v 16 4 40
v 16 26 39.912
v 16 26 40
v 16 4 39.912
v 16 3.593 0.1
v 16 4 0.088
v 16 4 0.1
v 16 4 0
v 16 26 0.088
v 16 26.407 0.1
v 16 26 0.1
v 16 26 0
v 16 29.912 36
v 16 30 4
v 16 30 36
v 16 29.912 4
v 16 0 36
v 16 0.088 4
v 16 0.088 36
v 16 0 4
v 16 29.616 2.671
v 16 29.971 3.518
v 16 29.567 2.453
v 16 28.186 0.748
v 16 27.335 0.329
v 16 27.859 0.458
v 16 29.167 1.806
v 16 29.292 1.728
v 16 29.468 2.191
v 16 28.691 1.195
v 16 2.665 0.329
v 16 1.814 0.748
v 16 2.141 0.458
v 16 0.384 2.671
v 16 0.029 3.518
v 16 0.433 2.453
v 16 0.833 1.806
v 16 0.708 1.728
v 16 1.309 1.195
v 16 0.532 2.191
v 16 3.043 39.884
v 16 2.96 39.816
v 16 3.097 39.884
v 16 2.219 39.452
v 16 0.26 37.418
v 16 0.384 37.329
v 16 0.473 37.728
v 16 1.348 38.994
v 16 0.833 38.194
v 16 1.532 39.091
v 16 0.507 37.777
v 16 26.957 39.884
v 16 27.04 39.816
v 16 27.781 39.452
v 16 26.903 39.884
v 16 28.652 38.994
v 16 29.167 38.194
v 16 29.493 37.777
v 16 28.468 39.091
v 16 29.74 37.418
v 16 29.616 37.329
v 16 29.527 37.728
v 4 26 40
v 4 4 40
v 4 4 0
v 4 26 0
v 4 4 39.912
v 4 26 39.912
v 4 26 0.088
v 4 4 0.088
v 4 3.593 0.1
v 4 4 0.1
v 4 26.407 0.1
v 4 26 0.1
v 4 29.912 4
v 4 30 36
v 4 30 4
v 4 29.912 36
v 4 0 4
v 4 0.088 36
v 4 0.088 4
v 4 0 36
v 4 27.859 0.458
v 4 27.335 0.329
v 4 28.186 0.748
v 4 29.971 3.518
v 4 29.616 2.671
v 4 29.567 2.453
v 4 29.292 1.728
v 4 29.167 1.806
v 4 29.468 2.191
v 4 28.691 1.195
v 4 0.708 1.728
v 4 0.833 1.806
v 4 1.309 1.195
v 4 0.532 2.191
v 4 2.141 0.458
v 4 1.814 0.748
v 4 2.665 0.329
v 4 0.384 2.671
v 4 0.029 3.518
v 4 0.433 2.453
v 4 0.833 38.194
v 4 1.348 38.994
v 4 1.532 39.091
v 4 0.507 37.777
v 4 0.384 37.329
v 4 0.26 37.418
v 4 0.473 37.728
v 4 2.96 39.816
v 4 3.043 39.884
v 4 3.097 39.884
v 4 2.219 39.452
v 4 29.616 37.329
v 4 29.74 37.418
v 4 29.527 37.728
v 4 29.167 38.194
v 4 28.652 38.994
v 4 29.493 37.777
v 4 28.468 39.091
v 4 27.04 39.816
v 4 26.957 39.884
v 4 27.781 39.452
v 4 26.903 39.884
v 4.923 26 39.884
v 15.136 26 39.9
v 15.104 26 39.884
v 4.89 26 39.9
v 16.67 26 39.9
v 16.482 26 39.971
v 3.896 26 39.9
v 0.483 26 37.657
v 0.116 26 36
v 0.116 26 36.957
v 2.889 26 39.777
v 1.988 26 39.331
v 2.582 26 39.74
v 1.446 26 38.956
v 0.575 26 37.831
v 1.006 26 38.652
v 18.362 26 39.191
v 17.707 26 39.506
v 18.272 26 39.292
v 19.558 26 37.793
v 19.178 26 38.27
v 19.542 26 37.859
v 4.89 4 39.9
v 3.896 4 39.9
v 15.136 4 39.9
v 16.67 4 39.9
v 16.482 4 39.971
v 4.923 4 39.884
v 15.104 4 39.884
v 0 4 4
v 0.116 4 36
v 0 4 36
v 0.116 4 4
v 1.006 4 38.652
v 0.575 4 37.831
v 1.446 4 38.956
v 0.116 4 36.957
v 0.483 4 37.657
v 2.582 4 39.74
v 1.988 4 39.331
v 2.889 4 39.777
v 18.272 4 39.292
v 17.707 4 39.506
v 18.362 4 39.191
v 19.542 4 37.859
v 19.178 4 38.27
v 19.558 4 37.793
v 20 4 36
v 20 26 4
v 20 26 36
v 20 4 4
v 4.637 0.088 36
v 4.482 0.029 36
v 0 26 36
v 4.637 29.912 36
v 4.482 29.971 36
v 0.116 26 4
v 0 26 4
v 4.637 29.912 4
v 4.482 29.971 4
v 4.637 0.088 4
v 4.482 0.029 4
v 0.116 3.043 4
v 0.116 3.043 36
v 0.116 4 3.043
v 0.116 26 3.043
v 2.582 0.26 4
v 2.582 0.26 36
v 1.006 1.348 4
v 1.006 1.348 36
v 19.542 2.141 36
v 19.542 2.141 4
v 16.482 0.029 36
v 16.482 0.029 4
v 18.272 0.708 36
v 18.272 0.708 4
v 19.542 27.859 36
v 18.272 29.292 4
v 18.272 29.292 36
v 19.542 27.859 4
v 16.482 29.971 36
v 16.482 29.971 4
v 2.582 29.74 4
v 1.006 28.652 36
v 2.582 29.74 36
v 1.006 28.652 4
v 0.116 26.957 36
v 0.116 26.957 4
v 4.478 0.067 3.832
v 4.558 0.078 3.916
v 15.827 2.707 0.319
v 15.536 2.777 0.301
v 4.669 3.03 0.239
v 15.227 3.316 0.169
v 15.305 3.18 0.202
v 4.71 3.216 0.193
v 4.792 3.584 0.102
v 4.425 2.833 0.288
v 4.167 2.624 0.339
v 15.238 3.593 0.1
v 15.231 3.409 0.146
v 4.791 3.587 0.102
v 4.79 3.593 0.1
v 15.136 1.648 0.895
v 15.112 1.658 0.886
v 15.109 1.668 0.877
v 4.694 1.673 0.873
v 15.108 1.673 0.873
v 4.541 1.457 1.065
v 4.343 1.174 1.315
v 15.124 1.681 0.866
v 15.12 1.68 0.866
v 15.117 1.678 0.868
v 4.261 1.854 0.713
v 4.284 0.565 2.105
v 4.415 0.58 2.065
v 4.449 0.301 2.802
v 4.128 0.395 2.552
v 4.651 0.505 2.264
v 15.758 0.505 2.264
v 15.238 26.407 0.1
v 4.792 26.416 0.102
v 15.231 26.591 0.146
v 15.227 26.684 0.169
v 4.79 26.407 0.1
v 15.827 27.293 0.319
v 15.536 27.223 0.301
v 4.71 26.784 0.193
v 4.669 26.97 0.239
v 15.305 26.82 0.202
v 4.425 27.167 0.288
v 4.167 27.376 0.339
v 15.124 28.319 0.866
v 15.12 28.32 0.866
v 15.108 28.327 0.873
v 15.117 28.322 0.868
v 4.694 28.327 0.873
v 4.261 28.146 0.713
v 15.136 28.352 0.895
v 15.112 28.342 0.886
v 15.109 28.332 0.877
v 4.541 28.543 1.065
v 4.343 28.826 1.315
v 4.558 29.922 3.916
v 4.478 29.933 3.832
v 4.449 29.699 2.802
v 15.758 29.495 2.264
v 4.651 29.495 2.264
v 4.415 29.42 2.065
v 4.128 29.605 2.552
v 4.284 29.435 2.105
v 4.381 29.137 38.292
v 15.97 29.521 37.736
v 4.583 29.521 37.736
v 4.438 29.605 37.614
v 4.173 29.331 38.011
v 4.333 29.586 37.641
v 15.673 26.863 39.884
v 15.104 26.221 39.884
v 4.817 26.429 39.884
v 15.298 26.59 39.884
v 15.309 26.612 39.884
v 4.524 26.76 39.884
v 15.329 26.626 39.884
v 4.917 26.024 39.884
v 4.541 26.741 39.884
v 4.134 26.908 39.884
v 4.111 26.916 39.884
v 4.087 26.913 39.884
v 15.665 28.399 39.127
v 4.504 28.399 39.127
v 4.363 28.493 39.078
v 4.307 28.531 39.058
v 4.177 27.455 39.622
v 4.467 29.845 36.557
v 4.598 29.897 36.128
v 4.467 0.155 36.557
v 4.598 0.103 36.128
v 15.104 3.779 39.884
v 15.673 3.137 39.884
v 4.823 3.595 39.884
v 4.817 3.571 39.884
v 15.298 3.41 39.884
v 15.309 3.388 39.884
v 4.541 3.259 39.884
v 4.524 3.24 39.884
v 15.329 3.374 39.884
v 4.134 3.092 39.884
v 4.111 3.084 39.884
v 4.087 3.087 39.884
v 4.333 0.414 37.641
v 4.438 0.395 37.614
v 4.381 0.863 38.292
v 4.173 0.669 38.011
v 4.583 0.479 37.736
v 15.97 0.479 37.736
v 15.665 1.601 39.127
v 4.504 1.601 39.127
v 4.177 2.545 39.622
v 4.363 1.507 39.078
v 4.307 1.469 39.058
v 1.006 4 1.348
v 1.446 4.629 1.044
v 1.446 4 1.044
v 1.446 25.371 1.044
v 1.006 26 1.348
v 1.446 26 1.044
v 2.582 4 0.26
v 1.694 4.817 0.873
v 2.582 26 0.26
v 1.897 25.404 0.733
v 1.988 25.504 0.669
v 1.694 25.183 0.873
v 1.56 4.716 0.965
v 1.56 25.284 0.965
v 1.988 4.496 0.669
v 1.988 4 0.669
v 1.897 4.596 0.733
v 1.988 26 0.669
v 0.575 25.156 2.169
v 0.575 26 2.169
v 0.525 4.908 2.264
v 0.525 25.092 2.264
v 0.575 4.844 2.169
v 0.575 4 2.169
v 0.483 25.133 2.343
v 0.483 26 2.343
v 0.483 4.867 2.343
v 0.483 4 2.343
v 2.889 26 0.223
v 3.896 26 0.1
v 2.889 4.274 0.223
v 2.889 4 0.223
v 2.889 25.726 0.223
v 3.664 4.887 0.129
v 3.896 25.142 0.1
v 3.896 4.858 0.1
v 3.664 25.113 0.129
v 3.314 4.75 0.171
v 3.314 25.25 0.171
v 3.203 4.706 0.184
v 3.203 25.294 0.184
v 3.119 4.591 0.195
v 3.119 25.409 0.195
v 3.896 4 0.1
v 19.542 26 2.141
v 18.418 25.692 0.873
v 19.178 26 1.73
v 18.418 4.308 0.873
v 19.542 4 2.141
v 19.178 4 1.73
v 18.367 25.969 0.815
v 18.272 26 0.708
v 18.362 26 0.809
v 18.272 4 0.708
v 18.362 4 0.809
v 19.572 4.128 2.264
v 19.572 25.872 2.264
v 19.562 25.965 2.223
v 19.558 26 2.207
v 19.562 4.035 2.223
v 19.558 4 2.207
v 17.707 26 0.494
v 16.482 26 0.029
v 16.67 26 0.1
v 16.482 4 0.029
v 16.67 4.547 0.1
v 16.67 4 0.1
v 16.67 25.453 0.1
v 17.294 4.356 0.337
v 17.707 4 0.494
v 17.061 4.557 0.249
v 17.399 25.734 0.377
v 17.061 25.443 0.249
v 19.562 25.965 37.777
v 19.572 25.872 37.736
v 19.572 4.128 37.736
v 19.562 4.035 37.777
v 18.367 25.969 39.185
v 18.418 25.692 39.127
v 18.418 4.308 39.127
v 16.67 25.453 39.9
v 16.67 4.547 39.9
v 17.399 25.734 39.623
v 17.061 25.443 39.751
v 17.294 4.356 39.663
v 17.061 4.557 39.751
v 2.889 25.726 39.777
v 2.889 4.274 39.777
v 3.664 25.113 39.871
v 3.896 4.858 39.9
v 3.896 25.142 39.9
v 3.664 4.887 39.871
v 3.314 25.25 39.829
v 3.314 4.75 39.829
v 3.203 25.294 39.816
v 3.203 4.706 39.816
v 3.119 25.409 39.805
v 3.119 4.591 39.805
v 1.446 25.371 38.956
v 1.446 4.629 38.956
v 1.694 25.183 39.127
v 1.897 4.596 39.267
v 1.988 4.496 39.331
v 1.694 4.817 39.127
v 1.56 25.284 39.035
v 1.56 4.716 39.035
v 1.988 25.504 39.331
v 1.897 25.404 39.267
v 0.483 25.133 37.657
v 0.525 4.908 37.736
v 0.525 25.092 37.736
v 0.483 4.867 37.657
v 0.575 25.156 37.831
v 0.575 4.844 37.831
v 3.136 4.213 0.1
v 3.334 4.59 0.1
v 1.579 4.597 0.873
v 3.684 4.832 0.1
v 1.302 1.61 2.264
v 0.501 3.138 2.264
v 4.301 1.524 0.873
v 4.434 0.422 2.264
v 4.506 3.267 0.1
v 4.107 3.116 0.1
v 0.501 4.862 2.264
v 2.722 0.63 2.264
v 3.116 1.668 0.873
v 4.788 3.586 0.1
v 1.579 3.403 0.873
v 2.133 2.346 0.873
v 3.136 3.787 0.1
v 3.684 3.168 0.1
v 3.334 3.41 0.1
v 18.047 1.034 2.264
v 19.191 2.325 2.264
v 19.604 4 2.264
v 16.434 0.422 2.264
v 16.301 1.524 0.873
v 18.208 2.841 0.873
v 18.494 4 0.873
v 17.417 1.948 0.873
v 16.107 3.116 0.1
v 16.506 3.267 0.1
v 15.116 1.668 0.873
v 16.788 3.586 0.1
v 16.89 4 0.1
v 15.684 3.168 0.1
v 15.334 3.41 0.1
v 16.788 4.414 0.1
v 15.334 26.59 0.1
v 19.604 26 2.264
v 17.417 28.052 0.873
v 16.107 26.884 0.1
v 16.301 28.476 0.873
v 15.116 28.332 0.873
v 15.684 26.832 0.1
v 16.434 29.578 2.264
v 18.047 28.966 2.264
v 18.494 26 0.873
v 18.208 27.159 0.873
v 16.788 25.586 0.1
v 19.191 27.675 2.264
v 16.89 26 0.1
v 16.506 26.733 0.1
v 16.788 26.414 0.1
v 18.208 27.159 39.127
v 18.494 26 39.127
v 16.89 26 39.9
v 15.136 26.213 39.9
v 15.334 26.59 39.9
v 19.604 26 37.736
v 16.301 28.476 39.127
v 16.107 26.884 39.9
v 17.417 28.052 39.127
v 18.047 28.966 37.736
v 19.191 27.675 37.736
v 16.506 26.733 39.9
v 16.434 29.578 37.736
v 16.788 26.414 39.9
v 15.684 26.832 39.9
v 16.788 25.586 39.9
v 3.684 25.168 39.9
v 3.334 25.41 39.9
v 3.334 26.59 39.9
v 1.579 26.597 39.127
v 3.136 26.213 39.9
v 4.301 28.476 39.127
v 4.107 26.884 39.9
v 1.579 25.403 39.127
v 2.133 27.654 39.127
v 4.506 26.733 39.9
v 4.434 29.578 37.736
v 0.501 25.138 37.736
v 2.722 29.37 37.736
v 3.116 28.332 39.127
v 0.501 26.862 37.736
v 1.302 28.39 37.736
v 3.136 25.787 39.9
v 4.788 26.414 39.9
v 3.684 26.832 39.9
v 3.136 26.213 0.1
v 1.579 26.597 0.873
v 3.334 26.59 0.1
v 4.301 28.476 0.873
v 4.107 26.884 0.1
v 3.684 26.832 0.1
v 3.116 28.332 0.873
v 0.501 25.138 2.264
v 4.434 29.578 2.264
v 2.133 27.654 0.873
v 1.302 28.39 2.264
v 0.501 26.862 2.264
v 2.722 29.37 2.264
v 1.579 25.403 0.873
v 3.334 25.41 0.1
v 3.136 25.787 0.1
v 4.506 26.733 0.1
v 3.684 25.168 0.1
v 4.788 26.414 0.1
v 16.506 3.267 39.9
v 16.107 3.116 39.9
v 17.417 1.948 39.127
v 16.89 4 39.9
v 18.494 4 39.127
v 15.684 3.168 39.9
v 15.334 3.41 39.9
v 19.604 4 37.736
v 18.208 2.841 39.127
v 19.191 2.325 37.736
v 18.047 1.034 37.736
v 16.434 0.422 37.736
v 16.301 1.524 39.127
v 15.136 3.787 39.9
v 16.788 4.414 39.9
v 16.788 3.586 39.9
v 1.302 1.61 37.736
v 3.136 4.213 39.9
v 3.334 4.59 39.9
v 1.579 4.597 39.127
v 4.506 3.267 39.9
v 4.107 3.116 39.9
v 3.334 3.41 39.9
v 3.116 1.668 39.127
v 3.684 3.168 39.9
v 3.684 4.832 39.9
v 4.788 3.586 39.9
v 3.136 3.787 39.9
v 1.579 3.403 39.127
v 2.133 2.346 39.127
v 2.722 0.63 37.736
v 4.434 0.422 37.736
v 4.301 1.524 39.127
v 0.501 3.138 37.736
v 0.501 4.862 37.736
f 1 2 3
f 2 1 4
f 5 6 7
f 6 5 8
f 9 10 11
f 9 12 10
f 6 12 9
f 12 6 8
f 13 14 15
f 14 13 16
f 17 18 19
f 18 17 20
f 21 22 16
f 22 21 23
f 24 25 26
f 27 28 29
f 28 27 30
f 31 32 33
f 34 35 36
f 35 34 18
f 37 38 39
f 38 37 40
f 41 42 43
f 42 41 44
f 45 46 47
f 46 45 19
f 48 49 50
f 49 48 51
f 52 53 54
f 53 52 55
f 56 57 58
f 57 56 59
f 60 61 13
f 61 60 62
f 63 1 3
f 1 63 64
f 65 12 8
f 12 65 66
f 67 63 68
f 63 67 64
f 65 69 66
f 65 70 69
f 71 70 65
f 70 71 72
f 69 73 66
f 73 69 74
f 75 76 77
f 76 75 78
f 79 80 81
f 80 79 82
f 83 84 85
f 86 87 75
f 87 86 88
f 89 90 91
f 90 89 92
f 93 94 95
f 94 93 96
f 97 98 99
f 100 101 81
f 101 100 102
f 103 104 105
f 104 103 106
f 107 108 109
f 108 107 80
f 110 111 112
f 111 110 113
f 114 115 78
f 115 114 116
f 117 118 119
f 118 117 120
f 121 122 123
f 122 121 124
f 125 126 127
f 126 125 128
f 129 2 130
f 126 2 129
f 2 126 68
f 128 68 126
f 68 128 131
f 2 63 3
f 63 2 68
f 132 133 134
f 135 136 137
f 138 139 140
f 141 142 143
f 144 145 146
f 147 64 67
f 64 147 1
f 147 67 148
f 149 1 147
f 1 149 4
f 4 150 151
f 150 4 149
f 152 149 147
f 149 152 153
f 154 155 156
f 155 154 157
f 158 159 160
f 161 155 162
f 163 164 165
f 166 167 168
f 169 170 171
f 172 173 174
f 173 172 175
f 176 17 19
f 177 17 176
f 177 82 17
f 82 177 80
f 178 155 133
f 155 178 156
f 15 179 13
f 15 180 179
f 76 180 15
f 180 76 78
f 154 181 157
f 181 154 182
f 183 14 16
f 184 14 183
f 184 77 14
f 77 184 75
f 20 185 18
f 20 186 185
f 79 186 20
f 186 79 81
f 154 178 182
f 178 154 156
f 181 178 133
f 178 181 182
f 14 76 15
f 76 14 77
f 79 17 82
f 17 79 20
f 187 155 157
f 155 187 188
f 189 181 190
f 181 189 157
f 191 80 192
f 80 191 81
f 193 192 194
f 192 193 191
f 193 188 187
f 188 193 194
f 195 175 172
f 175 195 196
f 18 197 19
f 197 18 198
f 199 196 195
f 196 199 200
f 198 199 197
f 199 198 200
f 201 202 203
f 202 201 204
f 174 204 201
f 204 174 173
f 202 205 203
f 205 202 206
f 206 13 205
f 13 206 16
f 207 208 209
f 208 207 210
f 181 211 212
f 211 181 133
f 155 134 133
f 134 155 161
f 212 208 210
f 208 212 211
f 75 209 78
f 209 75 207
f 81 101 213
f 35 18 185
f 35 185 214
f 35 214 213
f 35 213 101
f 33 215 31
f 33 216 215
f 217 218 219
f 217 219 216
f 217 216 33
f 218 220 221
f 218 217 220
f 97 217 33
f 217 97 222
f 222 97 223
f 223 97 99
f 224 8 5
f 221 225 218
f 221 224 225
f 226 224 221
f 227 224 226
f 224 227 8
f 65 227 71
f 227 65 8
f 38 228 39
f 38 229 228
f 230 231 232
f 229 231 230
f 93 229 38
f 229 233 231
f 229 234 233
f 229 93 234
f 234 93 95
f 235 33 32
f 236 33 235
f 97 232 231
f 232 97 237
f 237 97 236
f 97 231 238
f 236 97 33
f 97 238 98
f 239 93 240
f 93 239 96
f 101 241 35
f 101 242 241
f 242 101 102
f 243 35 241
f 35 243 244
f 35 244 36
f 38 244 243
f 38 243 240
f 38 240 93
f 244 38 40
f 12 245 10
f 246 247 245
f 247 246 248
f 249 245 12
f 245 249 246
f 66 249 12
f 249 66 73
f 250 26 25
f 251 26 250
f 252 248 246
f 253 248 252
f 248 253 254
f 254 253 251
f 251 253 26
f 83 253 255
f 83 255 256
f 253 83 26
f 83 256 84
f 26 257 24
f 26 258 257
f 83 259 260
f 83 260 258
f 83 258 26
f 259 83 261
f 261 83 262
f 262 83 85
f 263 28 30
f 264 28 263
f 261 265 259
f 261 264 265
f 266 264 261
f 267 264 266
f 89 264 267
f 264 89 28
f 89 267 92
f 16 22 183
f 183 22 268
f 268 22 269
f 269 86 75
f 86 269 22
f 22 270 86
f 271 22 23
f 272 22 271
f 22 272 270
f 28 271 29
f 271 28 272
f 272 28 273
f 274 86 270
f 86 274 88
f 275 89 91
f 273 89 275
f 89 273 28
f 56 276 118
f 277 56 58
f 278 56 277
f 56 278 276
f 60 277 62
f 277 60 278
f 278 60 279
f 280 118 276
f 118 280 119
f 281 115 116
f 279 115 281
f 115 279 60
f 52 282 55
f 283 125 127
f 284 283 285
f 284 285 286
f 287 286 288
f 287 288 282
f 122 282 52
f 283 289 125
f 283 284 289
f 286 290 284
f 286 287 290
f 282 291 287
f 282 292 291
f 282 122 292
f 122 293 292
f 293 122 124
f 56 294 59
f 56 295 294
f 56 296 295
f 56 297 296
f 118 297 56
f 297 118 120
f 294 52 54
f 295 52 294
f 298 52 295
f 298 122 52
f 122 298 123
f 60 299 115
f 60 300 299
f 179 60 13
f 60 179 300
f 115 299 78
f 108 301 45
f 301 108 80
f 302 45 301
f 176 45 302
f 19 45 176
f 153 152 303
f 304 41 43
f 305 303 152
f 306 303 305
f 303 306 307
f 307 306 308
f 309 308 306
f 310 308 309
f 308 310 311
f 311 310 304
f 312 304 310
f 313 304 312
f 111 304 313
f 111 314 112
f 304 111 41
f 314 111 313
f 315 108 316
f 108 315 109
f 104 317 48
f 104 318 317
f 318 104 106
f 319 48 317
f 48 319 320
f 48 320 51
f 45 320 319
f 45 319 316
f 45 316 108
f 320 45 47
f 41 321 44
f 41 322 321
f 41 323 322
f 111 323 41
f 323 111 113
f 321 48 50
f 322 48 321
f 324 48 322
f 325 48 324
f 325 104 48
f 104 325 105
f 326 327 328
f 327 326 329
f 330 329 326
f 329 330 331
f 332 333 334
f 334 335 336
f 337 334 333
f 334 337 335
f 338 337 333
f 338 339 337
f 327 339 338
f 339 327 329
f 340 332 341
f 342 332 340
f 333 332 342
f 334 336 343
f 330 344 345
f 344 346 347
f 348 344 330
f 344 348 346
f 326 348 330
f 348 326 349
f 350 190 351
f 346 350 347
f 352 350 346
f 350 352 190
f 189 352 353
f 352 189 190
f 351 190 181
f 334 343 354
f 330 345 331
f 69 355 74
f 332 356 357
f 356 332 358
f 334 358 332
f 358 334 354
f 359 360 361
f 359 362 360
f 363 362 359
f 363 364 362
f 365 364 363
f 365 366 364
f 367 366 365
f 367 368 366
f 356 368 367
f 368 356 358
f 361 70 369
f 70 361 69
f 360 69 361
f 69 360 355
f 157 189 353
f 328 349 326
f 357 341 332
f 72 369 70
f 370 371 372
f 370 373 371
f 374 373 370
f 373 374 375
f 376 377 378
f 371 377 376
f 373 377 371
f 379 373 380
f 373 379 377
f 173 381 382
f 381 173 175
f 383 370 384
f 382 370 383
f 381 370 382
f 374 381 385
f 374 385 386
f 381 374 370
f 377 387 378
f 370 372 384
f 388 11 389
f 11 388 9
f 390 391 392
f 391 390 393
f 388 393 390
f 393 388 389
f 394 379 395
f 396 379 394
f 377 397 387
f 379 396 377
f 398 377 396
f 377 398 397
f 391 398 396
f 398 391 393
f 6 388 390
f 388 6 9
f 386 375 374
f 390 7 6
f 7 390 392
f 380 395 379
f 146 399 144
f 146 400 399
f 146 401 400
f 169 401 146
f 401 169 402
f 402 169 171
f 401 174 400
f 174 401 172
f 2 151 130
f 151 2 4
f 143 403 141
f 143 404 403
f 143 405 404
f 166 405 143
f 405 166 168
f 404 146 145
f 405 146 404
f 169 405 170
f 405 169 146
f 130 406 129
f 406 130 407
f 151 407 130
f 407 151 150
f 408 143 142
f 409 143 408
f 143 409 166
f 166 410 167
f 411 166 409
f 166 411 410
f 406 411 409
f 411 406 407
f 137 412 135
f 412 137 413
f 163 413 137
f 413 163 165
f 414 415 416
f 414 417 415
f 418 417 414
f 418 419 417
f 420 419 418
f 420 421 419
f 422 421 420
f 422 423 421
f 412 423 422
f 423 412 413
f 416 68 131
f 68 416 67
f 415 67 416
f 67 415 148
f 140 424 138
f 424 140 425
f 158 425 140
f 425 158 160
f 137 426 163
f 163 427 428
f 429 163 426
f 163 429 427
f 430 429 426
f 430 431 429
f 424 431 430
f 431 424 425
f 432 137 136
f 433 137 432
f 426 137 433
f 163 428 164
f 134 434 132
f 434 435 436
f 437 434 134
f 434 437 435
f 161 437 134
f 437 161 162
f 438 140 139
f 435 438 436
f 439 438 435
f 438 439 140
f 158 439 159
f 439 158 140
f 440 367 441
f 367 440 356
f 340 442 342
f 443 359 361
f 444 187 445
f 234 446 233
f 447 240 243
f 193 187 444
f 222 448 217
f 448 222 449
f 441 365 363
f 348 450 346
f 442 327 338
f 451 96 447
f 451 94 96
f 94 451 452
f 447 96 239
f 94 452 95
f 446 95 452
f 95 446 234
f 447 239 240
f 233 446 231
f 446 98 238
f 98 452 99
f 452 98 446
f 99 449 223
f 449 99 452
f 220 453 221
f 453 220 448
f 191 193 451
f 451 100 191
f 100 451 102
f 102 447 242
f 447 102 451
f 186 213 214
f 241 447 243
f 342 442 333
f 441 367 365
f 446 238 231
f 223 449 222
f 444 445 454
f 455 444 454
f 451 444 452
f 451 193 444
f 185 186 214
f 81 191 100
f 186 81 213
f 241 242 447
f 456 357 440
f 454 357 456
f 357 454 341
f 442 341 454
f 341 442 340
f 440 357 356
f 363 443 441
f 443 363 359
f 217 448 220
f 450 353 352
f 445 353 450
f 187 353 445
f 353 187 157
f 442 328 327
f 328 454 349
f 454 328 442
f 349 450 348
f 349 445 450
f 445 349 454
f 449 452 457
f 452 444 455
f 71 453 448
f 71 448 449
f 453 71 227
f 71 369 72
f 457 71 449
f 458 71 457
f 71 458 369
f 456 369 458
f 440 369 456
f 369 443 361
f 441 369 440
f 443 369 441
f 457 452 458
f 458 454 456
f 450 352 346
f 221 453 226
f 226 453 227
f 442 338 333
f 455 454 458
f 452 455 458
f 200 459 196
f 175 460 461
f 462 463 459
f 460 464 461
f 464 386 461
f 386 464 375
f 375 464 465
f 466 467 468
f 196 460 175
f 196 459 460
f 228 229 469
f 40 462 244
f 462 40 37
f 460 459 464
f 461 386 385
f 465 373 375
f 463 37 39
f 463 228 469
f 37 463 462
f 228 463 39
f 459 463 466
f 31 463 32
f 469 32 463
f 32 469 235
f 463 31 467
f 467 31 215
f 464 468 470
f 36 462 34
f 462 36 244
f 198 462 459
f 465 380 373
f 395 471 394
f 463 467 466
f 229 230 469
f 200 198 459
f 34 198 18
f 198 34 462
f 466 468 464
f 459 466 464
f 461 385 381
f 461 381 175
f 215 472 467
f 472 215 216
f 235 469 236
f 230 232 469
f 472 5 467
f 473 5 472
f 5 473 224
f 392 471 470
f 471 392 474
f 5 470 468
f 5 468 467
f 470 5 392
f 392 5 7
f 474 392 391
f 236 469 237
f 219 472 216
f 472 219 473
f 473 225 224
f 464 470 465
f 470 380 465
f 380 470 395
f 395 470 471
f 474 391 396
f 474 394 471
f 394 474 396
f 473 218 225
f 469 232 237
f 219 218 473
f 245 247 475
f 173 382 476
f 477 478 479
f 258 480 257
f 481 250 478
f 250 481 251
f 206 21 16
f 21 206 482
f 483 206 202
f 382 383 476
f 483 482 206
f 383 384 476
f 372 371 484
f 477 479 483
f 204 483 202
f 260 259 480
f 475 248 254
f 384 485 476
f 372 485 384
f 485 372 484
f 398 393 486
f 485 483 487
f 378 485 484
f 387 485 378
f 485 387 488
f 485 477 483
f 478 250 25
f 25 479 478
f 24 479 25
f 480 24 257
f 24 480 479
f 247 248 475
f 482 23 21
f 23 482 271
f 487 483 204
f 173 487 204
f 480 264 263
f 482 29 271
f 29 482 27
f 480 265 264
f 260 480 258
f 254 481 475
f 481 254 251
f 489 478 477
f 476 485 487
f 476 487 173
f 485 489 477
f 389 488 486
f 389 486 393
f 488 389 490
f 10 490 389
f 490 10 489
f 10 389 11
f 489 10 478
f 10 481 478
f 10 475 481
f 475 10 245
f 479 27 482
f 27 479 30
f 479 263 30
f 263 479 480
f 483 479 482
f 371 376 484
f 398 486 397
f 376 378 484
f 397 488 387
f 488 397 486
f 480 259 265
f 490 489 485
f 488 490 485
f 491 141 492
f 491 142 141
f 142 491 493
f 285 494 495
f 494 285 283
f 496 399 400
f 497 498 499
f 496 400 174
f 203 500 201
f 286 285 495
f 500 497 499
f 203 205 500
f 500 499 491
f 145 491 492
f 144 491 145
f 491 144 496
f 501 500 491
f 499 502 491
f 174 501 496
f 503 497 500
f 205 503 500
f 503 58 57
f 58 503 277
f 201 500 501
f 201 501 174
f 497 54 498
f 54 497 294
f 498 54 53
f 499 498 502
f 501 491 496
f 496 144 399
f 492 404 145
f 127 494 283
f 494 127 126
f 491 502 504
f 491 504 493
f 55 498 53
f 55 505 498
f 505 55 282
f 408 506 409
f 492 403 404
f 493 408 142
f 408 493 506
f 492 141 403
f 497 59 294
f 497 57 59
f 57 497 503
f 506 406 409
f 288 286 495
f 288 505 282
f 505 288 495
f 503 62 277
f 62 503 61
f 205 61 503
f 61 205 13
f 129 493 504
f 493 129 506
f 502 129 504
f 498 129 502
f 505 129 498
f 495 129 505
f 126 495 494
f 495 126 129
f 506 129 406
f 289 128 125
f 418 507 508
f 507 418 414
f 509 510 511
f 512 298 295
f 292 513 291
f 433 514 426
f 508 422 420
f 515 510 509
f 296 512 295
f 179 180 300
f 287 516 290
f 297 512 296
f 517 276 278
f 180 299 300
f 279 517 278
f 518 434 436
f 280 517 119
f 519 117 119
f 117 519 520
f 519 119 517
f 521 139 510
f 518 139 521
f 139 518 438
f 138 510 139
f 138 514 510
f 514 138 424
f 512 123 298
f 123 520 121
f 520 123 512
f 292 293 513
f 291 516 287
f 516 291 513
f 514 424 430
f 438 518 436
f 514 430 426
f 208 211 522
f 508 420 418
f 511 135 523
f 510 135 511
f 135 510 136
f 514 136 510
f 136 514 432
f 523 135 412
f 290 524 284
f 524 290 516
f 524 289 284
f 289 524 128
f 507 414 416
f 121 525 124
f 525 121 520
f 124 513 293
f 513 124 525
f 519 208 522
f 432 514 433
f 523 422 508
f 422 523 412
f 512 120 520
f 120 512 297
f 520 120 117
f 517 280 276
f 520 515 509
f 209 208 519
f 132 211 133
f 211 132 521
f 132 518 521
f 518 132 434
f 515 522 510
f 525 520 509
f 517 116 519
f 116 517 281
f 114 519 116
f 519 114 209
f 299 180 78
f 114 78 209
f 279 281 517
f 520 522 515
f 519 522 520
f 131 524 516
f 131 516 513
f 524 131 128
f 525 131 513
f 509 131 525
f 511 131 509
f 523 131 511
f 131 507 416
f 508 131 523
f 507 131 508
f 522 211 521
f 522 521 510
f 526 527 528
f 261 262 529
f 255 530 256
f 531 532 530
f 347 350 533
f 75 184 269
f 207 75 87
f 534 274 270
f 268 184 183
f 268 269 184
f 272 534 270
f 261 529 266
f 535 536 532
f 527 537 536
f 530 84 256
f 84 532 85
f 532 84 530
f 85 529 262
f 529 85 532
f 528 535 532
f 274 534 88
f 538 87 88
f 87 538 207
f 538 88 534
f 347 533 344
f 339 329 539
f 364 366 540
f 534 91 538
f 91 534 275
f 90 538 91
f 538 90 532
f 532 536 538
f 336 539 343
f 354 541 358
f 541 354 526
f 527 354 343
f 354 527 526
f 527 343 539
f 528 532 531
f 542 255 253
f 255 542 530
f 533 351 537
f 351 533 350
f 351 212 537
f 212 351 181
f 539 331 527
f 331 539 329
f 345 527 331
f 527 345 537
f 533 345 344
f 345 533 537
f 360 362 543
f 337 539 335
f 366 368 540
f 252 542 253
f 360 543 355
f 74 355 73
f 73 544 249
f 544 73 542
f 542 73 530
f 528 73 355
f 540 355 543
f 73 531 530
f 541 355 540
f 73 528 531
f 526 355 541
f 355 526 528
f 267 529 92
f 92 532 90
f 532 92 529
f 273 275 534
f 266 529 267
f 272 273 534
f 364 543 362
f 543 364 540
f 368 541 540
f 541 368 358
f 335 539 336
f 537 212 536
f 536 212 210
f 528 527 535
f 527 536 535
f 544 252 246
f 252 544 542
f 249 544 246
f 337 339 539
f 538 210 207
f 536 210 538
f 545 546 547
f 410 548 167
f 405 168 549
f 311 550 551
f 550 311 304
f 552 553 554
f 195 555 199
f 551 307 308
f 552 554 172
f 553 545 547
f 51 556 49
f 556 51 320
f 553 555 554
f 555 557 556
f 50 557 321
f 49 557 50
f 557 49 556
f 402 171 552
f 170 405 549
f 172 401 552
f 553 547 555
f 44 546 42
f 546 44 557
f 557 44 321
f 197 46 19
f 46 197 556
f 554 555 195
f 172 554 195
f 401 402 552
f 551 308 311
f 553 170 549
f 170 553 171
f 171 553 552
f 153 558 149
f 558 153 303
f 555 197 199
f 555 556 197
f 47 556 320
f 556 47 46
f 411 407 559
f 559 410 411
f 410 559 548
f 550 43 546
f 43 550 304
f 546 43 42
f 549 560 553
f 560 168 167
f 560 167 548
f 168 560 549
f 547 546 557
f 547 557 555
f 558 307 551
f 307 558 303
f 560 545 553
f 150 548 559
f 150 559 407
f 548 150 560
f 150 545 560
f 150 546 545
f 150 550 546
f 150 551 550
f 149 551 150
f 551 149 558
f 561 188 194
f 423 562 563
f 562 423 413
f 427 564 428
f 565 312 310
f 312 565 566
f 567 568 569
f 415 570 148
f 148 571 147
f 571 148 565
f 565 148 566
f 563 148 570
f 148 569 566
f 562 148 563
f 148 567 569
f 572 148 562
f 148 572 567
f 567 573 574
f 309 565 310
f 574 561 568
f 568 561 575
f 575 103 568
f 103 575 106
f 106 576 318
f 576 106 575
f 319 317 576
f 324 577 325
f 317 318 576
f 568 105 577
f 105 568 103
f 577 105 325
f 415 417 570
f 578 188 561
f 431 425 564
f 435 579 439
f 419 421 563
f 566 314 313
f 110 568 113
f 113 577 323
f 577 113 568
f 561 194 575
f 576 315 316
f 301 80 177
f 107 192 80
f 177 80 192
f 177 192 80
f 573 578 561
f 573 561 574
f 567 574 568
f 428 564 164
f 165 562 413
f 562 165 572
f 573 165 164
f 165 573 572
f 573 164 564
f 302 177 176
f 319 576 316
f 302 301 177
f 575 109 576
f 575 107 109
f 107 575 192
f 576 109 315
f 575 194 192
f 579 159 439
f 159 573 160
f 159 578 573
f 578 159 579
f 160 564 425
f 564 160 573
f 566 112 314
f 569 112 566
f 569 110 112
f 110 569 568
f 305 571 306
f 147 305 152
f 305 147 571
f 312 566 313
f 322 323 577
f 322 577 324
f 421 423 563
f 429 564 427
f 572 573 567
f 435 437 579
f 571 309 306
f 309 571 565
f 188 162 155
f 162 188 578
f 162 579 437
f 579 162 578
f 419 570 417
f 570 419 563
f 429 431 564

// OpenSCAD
module cubeR(size=[10,10,10],radius=2,center=false){
	trans_dist = center==true ? -size/2 : [0,0,0];
	x=size[0];
	y=size[1];
	z=size[2];
	r=radius;
	translate(trans_dist)
		hull(){
			union(){
				translate([r,r,r])
					sphere(r);
				translate([x-r,r,r])
					sphere(r);
				translate([x-r,y-r,r])
					sphere(r);
				translate([x-r,y-r,z-r])
					sphere(r);
				translate([r,y-r,z-r])
					sphere(r);
				translate([r,y-r,r])
					sphere(r);
				translate([x-r,r,z-r])
					sphere(r);
				translate([r,r,z-r])
					sphere(r);
			}
		}
}

module cubeS(size=[10,10,10],radius=2,center=false){
	trans_dist = center==true ? -size/2 : [0,0,0];
	x=size[0];
	y=size[1];
	z=size[2];
	r=radius;
	translate(trans_dist)
		union(){
			translate([r,r,0])
				cube([x-2*r,y-2*r,z],center=false);
			translate([0,r,r])
				cube([x,y-2*r,z-2*r],center=false);
			translate([r,0,r])
				cube([x-2*r,y,z-2*r],center=false);
			translate([r,r,r])
				cylinder(h=z-2*r,r=r);
			translate([x-r,r,r])
				cylinder(h=z-2*r,r=r);
			translate([x-r,y-r,r])
				cylinder(h=z-2*r,r=r);
			translate([r,y-r,r])
				cylinder(h=z-2*r,r=r);
			translate([r,r,r])
				rotate([0,90,0])
					cylinder(h=x-2*r,r=r);
			translate([r,y-r,r])
				rotate([0,90,0])
					cylinder(h=x-2*r,r=r);
			translate([r,y-r,z-r])
				rotate([0,90,0])
					cylinder(h=x-2*r,r=r);
			translate([r,r,z-r])
				rotate([0,90,0])
					cylinder(h=x-2*r,r=r);
			translate([r,r,r])
				rotate([270,0,0])
					cylinder(h=y-2*r,r=r);
			translate([x-r,r,r])
				rotate([270,0,0])
					cylinder(h=y-2*r,r=r);
			translate([x-r,r,z-r])
				rotate([270,0,0])
					cylinder(h=y-2*r,r=r);
			translate([r,r,z-r])
				rotate([270,0,0])
					cylinder(h=y-2*r,r=r);
			translate([r,r,r])
				sphere(r);
			translate([x-r,r,r])
				sphere(r);
			translate([x-r,y-r,r])
				sphere(r);
			translate([x-r,y-r,z-r])
				sphere(r);
			translate([r,y-r,z-r])
				sphere(r);
			translate([r,y-r,r])
				sphere(r);
			translate([x-r,r,z-r])
				sphere(r);
			translate([r,r,z-r])
				sphere(r);
		}
}

cubeS(size=[20,30,40],radius=4, center=false);
